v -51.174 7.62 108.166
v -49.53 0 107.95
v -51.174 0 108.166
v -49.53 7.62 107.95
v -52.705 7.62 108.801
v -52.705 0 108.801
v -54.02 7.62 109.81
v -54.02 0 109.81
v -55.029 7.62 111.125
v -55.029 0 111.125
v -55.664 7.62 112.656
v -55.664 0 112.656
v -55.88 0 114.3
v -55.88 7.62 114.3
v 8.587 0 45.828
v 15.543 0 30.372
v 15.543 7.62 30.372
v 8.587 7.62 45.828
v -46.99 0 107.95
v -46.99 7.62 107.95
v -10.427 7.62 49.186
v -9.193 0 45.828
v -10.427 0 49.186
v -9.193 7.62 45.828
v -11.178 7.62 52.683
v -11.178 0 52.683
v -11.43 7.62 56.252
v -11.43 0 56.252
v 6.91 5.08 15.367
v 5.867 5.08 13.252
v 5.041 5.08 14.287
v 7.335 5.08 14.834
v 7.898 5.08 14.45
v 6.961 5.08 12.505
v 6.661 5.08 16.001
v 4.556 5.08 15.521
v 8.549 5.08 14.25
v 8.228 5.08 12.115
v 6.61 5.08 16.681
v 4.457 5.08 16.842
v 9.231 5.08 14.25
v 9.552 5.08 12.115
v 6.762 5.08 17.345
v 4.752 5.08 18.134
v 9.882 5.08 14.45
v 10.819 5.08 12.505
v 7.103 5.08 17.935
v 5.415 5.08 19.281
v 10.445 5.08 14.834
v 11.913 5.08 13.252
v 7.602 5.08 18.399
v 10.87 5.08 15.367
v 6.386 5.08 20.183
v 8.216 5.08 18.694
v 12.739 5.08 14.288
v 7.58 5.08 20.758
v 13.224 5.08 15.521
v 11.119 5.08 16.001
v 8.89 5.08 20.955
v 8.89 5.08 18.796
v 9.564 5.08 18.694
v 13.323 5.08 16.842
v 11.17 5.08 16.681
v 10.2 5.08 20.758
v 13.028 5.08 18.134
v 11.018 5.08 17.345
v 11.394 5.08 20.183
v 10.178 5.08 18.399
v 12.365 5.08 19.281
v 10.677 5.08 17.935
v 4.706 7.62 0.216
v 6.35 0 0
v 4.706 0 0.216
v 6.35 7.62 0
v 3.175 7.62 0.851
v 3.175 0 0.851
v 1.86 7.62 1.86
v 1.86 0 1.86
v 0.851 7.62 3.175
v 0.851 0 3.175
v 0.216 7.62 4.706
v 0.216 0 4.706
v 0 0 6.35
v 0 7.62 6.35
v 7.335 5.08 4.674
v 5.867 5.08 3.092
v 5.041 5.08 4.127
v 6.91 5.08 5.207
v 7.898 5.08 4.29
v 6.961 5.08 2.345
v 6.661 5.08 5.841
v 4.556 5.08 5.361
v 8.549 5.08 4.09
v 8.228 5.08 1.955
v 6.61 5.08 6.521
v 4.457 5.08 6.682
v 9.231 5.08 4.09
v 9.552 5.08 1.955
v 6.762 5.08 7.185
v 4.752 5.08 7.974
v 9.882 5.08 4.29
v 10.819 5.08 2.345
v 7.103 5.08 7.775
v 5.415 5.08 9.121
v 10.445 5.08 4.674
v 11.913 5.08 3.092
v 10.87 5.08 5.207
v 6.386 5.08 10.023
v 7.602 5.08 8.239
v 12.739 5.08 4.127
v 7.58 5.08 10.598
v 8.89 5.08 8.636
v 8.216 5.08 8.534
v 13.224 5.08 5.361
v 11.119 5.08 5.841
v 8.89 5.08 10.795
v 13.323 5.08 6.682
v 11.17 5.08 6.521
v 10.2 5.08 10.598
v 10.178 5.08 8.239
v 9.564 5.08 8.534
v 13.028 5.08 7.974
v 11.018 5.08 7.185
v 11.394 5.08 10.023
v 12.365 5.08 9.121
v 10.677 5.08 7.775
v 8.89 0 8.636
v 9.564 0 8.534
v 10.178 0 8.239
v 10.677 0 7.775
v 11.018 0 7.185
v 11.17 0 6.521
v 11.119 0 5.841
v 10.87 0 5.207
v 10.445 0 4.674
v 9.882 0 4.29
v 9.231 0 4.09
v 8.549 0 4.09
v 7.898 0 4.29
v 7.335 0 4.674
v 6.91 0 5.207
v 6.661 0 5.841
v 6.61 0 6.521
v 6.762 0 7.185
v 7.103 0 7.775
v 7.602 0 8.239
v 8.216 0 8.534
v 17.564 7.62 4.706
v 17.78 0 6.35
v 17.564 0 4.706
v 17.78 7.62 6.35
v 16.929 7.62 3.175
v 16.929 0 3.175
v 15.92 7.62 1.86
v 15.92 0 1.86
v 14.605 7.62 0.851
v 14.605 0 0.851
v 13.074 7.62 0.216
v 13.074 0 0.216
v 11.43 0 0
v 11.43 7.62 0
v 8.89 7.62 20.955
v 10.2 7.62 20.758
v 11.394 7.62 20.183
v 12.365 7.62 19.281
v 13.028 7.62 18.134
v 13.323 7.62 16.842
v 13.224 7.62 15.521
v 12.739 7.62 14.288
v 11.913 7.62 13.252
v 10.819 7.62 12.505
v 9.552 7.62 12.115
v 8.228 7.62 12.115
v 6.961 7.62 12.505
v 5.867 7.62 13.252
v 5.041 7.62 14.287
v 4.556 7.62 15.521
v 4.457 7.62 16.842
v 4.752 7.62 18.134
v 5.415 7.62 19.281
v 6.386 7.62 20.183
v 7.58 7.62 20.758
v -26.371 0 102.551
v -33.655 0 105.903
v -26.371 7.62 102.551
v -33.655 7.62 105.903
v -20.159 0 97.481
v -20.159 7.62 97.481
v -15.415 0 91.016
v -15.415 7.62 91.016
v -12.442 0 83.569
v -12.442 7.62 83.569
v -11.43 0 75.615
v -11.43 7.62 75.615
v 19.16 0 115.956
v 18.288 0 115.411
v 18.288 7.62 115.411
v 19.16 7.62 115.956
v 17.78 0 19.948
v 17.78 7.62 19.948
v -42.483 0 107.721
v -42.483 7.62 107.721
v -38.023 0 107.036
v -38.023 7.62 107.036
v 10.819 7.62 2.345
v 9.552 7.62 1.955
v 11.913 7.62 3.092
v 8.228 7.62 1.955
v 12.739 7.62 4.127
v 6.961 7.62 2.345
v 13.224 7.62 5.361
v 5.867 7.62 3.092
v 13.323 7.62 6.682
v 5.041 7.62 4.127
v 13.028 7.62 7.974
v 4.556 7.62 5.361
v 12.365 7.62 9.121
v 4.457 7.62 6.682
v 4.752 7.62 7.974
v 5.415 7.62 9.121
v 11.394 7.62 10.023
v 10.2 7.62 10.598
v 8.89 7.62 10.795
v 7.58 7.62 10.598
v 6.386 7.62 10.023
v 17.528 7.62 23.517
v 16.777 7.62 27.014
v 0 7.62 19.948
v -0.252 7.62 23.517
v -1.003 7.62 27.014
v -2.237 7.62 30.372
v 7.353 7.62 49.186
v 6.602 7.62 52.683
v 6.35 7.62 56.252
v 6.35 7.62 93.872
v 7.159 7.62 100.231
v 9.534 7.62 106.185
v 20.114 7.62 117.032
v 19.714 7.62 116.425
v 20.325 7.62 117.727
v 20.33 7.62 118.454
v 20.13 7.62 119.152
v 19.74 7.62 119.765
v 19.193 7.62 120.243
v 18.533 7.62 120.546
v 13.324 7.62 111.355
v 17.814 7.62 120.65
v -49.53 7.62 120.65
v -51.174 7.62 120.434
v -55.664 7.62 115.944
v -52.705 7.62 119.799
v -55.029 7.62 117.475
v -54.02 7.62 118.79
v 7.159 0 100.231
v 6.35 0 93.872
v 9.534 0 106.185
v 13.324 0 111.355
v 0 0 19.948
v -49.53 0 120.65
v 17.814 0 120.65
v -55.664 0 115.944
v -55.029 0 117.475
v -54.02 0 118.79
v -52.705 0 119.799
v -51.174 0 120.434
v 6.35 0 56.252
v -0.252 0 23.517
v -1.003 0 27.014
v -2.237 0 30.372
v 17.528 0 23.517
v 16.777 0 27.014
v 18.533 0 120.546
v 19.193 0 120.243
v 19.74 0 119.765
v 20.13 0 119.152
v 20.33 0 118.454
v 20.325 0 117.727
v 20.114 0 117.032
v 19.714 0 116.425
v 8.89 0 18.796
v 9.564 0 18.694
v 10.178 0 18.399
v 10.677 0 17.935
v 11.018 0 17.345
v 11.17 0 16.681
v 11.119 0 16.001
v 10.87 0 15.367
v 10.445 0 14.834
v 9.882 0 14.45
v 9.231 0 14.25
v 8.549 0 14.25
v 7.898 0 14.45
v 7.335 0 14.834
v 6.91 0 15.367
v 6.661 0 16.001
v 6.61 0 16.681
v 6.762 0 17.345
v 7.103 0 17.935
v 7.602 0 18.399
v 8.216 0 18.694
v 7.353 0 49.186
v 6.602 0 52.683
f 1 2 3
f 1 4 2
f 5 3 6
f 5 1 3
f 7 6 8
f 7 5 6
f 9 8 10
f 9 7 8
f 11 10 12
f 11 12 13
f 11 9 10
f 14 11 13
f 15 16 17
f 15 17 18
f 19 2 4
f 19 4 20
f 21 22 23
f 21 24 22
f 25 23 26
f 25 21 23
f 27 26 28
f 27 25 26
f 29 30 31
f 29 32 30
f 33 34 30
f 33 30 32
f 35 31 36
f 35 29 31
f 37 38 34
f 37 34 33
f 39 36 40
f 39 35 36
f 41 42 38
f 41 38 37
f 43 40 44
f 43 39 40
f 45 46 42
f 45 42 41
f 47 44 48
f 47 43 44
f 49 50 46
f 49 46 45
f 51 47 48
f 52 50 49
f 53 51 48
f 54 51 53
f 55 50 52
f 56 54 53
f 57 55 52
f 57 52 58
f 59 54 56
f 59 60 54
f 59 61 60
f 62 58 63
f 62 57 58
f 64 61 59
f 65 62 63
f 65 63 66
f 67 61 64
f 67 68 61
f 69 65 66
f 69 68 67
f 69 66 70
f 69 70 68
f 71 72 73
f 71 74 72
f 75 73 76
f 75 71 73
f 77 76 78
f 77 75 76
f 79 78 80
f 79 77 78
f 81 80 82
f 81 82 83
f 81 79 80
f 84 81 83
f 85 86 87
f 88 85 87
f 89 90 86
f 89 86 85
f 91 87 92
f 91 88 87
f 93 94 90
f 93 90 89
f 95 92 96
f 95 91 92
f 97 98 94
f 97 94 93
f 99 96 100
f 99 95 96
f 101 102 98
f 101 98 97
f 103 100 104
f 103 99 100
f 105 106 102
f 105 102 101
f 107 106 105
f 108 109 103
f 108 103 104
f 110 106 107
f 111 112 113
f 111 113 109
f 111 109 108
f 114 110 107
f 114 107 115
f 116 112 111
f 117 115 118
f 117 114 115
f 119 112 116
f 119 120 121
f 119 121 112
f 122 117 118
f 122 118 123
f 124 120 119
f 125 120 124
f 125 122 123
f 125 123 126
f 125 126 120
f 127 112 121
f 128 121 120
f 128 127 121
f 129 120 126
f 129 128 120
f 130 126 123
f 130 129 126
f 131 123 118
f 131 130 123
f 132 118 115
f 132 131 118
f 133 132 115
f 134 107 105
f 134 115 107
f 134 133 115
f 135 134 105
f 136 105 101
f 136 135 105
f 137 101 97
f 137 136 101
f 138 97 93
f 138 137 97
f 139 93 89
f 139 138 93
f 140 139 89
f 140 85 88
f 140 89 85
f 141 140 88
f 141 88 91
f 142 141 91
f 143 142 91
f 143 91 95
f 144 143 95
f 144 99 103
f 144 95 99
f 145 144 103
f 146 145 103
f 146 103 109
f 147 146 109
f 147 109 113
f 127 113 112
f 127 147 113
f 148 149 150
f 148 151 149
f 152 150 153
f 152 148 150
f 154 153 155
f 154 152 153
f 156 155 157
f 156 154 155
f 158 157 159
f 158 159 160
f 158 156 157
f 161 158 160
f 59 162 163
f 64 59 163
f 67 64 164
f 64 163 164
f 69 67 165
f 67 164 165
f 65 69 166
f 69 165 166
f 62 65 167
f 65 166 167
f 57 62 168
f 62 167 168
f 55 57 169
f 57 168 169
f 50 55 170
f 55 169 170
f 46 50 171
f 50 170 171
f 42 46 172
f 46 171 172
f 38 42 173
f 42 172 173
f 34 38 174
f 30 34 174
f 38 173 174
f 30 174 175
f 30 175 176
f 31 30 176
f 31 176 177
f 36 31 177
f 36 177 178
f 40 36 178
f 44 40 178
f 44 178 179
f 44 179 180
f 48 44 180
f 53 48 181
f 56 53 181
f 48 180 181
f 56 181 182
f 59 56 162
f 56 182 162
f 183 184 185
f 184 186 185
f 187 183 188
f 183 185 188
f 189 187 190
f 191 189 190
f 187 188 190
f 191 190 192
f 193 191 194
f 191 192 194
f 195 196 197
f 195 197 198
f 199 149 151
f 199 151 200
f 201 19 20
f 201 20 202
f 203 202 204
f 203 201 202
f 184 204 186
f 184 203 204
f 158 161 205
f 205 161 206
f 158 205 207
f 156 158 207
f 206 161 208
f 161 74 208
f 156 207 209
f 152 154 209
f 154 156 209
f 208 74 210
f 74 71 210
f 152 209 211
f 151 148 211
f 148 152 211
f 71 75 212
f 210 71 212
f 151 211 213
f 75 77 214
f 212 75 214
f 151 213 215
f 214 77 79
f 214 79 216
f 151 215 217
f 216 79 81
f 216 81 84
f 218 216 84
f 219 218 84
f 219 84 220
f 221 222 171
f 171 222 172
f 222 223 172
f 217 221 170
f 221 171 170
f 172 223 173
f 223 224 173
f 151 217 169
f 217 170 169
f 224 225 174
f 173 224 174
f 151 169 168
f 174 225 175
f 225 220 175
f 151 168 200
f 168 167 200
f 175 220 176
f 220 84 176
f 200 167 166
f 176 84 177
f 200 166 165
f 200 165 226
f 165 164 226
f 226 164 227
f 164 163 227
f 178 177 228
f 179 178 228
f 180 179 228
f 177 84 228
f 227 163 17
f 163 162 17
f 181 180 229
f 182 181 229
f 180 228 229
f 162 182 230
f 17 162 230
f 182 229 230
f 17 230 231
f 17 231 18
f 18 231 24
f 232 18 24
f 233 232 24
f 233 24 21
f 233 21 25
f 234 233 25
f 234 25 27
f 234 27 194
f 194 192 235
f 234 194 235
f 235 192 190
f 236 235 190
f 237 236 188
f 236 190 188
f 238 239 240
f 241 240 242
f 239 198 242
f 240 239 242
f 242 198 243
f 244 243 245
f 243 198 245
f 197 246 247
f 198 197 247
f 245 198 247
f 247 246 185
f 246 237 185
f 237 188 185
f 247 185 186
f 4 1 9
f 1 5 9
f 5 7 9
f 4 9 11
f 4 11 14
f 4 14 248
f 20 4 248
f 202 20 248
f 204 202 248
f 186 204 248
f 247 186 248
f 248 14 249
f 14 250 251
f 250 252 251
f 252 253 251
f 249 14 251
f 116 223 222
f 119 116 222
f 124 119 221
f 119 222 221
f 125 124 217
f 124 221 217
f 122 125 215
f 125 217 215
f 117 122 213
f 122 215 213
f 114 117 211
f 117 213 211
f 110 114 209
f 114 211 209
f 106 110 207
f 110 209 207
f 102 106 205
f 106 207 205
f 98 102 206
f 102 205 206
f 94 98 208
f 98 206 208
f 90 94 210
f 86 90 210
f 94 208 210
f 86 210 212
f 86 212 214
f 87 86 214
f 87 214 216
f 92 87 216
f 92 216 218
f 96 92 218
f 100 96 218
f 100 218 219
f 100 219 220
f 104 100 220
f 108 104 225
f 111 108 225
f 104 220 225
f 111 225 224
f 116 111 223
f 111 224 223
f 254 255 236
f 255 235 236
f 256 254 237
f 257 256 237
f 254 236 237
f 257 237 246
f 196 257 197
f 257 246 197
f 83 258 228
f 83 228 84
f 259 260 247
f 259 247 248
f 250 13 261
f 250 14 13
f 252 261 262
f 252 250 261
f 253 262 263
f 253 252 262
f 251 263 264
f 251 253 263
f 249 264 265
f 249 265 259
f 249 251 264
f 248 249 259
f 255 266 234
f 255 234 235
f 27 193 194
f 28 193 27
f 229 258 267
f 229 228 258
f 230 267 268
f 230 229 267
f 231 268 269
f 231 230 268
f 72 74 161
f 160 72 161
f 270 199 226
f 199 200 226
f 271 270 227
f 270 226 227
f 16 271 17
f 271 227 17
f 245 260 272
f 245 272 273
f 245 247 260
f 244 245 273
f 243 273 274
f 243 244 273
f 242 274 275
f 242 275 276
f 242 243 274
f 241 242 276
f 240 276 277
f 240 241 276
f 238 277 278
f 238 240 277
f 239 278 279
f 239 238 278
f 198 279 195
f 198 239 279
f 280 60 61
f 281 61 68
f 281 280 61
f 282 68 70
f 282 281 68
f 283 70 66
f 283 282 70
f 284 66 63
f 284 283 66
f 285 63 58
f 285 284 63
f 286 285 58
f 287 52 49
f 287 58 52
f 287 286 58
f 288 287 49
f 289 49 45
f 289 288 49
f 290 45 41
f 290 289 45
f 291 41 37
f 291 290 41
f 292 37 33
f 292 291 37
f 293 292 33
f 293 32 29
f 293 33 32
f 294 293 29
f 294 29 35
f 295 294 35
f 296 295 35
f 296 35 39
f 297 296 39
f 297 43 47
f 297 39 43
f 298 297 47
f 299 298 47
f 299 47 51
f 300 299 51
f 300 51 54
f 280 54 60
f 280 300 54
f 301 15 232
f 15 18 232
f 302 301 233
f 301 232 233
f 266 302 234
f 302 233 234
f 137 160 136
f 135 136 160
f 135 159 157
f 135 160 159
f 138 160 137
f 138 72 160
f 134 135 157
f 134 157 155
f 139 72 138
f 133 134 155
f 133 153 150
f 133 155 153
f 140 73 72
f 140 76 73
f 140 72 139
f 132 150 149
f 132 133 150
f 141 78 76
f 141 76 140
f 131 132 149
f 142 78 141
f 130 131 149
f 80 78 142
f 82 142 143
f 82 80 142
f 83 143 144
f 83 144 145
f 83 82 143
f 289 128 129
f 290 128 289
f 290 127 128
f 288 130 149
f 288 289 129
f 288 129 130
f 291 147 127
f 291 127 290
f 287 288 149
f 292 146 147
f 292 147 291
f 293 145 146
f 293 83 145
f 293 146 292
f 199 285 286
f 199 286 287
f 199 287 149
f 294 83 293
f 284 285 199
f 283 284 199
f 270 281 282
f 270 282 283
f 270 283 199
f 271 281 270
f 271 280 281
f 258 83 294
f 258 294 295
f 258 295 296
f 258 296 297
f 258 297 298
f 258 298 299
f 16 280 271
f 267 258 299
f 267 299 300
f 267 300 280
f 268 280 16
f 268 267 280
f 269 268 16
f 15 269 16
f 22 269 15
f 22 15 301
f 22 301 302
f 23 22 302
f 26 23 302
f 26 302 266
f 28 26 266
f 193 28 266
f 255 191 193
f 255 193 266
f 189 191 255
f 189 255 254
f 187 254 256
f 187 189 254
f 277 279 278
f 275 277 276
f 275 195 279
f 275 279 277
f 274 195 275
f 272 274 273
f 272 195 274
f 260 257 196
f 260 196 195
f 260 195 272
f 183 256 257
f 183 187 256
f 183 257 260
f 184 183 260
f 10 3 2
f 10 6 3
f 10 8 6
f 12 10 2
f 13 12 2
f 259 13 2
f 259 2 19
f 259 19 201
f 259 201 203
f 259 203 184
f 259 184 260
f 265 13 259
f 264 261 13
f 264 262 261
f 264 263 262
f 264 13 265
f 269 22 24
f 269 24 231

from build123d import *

# Parameters (mm, degrees)
SKETCH1_R           = 2.286
BOSS_EXTRUDE1_DEPTH = 7.62
FILLET1_R           = 25.4
FILLET3_R           = 44.45
FILLET2_R           = 6.35
FILLET4_R           = 31.75
SKETCH3_R           = 4.445
CUT_EXTRUDE1_DEPTH  = 2.54
FILLET5_R           = 2.54


# Some blends are built 0.0001 mm under size
with BuildPart() as part:
    # Sketch1 → Boss-Extrude1 (new body)
    with BuildSketch(Plane(origin=(0, 0, 0), x_dir=(1, 0, 0), z_dir=(0, 1, 0))):
        Polygon((0, 0), (17.78, 0), (17.78, -25.4), (6.35, -50.8), (6.35, -107.95), (26.67, -120.65), (-55.88, -120.65), (-55.88, -107.95), (-5.08, -107.95), (-11.43, -90.17), (-11.43, -50.8), (0, -25.4), align=None)
        with Locations(Location((8.89, -6.35, 0), (0, 0, 270))):
            Circle(SKETCH1_R, mode=Mode.SUBTRACT)
        with Locations(Location((8.89, -16.51, 0), (0, 0, 270))):
            Circle(SKETCH1_R, mode=Mode.SUBTRACT)
    extrude(amount=BOSS_EXTRUDE1_DEPTH)

    # Fillet1
    fillet1_edges = [part.edges().sort_by_distance(p)[0] for p in [
        (17.78, 3.81, 25.4),
        (6.35, 3.81, 50.8),
        (6.35, 3.81, 107.95),
        (-11.43, 3.81, 50.8),
        (0, 3.81, 25.4),
    ]]
    fillet(fillet1_edges, radius=FILLET1_R)

    # Fillet3
    # the kernel refuses this fillet: 44.45 mm, written as the material it adds along each edge
    with BuildSketch(Plane(origin=(-5.08, 0, 107.95), x_dir=(-0.3363363969981565, 0, -0.9417419115948374), z_dir=(0, 1, 0))) as fillet3_piece_1:
        with BuildLine():
            CenterArc((55.956286369, 24.518250668), FILLET3_R, 160.346175942, 53.130102354)
            Line((14.095858398, 39.468403515), (13.258649839, 39.767406572))
            Line((13.258649839, 39.767406572), (-0.837208559, 0.299003057))
            Line((-0.837208559, 0.299003057), (0, -0.889))
            ThreePointArc((0, -0.889), (9.439953655, -0.889), (18.138379728, -0.490365013))
            Line((18.138379728, -0.490365013), (18.879907309, 0))
        make_face()
    extrude(amount=7.62)

    # Fillet2
    fillet2_edges = [part.edges().sort_by_distance(p)[0] for p in [
        (17.78, 3.81, 0),
        (0, 3.81, 0),
        (-55.88, 3.81, 120.65),
        (-55.88, 3.81, 107.95),
    ]]
    fillet(fillet2_edges, radius=FILLET2_R - 0.0001)  # a hair under: the kernel refuses the full size

    # Fillet4
    fillet4_edges = [part.edges().sort_by_distance(p)[0] for p in [
        (-11.43, 3.81, 90.17),
    ]]
    fillet(fillet4_edges, radius=FILLET4_R)

    # Sketch3 → Cut-Extrude1 (cut)
    with BuildSketch(Plane(origin=(0, 7.62, 0), x_dir=(1, 0, 0), z_dir=(0, 1, 0))):
        with Locations(Location((8.89, -6.35, 0), (0, 0, 270))):
            Circle(SKETCH3_R)
        with Locations(Location((8.89, -16.51, 0), (0, 0, 270))):
            Circle(SKETCH3_R)
    extrude(amount=-CUT_EXTRUDE1_DEPTH, mode=Mode.SUBTRACT)

    # Fillet5
    fillet5_edges = [part.edges().sort_by_distance(p)[0] for p in [
        (26.67, 3.81, 120.65),
    ]]
    fillet(fillet5_edges, radius=FILLET5_R)


solid = part.part
